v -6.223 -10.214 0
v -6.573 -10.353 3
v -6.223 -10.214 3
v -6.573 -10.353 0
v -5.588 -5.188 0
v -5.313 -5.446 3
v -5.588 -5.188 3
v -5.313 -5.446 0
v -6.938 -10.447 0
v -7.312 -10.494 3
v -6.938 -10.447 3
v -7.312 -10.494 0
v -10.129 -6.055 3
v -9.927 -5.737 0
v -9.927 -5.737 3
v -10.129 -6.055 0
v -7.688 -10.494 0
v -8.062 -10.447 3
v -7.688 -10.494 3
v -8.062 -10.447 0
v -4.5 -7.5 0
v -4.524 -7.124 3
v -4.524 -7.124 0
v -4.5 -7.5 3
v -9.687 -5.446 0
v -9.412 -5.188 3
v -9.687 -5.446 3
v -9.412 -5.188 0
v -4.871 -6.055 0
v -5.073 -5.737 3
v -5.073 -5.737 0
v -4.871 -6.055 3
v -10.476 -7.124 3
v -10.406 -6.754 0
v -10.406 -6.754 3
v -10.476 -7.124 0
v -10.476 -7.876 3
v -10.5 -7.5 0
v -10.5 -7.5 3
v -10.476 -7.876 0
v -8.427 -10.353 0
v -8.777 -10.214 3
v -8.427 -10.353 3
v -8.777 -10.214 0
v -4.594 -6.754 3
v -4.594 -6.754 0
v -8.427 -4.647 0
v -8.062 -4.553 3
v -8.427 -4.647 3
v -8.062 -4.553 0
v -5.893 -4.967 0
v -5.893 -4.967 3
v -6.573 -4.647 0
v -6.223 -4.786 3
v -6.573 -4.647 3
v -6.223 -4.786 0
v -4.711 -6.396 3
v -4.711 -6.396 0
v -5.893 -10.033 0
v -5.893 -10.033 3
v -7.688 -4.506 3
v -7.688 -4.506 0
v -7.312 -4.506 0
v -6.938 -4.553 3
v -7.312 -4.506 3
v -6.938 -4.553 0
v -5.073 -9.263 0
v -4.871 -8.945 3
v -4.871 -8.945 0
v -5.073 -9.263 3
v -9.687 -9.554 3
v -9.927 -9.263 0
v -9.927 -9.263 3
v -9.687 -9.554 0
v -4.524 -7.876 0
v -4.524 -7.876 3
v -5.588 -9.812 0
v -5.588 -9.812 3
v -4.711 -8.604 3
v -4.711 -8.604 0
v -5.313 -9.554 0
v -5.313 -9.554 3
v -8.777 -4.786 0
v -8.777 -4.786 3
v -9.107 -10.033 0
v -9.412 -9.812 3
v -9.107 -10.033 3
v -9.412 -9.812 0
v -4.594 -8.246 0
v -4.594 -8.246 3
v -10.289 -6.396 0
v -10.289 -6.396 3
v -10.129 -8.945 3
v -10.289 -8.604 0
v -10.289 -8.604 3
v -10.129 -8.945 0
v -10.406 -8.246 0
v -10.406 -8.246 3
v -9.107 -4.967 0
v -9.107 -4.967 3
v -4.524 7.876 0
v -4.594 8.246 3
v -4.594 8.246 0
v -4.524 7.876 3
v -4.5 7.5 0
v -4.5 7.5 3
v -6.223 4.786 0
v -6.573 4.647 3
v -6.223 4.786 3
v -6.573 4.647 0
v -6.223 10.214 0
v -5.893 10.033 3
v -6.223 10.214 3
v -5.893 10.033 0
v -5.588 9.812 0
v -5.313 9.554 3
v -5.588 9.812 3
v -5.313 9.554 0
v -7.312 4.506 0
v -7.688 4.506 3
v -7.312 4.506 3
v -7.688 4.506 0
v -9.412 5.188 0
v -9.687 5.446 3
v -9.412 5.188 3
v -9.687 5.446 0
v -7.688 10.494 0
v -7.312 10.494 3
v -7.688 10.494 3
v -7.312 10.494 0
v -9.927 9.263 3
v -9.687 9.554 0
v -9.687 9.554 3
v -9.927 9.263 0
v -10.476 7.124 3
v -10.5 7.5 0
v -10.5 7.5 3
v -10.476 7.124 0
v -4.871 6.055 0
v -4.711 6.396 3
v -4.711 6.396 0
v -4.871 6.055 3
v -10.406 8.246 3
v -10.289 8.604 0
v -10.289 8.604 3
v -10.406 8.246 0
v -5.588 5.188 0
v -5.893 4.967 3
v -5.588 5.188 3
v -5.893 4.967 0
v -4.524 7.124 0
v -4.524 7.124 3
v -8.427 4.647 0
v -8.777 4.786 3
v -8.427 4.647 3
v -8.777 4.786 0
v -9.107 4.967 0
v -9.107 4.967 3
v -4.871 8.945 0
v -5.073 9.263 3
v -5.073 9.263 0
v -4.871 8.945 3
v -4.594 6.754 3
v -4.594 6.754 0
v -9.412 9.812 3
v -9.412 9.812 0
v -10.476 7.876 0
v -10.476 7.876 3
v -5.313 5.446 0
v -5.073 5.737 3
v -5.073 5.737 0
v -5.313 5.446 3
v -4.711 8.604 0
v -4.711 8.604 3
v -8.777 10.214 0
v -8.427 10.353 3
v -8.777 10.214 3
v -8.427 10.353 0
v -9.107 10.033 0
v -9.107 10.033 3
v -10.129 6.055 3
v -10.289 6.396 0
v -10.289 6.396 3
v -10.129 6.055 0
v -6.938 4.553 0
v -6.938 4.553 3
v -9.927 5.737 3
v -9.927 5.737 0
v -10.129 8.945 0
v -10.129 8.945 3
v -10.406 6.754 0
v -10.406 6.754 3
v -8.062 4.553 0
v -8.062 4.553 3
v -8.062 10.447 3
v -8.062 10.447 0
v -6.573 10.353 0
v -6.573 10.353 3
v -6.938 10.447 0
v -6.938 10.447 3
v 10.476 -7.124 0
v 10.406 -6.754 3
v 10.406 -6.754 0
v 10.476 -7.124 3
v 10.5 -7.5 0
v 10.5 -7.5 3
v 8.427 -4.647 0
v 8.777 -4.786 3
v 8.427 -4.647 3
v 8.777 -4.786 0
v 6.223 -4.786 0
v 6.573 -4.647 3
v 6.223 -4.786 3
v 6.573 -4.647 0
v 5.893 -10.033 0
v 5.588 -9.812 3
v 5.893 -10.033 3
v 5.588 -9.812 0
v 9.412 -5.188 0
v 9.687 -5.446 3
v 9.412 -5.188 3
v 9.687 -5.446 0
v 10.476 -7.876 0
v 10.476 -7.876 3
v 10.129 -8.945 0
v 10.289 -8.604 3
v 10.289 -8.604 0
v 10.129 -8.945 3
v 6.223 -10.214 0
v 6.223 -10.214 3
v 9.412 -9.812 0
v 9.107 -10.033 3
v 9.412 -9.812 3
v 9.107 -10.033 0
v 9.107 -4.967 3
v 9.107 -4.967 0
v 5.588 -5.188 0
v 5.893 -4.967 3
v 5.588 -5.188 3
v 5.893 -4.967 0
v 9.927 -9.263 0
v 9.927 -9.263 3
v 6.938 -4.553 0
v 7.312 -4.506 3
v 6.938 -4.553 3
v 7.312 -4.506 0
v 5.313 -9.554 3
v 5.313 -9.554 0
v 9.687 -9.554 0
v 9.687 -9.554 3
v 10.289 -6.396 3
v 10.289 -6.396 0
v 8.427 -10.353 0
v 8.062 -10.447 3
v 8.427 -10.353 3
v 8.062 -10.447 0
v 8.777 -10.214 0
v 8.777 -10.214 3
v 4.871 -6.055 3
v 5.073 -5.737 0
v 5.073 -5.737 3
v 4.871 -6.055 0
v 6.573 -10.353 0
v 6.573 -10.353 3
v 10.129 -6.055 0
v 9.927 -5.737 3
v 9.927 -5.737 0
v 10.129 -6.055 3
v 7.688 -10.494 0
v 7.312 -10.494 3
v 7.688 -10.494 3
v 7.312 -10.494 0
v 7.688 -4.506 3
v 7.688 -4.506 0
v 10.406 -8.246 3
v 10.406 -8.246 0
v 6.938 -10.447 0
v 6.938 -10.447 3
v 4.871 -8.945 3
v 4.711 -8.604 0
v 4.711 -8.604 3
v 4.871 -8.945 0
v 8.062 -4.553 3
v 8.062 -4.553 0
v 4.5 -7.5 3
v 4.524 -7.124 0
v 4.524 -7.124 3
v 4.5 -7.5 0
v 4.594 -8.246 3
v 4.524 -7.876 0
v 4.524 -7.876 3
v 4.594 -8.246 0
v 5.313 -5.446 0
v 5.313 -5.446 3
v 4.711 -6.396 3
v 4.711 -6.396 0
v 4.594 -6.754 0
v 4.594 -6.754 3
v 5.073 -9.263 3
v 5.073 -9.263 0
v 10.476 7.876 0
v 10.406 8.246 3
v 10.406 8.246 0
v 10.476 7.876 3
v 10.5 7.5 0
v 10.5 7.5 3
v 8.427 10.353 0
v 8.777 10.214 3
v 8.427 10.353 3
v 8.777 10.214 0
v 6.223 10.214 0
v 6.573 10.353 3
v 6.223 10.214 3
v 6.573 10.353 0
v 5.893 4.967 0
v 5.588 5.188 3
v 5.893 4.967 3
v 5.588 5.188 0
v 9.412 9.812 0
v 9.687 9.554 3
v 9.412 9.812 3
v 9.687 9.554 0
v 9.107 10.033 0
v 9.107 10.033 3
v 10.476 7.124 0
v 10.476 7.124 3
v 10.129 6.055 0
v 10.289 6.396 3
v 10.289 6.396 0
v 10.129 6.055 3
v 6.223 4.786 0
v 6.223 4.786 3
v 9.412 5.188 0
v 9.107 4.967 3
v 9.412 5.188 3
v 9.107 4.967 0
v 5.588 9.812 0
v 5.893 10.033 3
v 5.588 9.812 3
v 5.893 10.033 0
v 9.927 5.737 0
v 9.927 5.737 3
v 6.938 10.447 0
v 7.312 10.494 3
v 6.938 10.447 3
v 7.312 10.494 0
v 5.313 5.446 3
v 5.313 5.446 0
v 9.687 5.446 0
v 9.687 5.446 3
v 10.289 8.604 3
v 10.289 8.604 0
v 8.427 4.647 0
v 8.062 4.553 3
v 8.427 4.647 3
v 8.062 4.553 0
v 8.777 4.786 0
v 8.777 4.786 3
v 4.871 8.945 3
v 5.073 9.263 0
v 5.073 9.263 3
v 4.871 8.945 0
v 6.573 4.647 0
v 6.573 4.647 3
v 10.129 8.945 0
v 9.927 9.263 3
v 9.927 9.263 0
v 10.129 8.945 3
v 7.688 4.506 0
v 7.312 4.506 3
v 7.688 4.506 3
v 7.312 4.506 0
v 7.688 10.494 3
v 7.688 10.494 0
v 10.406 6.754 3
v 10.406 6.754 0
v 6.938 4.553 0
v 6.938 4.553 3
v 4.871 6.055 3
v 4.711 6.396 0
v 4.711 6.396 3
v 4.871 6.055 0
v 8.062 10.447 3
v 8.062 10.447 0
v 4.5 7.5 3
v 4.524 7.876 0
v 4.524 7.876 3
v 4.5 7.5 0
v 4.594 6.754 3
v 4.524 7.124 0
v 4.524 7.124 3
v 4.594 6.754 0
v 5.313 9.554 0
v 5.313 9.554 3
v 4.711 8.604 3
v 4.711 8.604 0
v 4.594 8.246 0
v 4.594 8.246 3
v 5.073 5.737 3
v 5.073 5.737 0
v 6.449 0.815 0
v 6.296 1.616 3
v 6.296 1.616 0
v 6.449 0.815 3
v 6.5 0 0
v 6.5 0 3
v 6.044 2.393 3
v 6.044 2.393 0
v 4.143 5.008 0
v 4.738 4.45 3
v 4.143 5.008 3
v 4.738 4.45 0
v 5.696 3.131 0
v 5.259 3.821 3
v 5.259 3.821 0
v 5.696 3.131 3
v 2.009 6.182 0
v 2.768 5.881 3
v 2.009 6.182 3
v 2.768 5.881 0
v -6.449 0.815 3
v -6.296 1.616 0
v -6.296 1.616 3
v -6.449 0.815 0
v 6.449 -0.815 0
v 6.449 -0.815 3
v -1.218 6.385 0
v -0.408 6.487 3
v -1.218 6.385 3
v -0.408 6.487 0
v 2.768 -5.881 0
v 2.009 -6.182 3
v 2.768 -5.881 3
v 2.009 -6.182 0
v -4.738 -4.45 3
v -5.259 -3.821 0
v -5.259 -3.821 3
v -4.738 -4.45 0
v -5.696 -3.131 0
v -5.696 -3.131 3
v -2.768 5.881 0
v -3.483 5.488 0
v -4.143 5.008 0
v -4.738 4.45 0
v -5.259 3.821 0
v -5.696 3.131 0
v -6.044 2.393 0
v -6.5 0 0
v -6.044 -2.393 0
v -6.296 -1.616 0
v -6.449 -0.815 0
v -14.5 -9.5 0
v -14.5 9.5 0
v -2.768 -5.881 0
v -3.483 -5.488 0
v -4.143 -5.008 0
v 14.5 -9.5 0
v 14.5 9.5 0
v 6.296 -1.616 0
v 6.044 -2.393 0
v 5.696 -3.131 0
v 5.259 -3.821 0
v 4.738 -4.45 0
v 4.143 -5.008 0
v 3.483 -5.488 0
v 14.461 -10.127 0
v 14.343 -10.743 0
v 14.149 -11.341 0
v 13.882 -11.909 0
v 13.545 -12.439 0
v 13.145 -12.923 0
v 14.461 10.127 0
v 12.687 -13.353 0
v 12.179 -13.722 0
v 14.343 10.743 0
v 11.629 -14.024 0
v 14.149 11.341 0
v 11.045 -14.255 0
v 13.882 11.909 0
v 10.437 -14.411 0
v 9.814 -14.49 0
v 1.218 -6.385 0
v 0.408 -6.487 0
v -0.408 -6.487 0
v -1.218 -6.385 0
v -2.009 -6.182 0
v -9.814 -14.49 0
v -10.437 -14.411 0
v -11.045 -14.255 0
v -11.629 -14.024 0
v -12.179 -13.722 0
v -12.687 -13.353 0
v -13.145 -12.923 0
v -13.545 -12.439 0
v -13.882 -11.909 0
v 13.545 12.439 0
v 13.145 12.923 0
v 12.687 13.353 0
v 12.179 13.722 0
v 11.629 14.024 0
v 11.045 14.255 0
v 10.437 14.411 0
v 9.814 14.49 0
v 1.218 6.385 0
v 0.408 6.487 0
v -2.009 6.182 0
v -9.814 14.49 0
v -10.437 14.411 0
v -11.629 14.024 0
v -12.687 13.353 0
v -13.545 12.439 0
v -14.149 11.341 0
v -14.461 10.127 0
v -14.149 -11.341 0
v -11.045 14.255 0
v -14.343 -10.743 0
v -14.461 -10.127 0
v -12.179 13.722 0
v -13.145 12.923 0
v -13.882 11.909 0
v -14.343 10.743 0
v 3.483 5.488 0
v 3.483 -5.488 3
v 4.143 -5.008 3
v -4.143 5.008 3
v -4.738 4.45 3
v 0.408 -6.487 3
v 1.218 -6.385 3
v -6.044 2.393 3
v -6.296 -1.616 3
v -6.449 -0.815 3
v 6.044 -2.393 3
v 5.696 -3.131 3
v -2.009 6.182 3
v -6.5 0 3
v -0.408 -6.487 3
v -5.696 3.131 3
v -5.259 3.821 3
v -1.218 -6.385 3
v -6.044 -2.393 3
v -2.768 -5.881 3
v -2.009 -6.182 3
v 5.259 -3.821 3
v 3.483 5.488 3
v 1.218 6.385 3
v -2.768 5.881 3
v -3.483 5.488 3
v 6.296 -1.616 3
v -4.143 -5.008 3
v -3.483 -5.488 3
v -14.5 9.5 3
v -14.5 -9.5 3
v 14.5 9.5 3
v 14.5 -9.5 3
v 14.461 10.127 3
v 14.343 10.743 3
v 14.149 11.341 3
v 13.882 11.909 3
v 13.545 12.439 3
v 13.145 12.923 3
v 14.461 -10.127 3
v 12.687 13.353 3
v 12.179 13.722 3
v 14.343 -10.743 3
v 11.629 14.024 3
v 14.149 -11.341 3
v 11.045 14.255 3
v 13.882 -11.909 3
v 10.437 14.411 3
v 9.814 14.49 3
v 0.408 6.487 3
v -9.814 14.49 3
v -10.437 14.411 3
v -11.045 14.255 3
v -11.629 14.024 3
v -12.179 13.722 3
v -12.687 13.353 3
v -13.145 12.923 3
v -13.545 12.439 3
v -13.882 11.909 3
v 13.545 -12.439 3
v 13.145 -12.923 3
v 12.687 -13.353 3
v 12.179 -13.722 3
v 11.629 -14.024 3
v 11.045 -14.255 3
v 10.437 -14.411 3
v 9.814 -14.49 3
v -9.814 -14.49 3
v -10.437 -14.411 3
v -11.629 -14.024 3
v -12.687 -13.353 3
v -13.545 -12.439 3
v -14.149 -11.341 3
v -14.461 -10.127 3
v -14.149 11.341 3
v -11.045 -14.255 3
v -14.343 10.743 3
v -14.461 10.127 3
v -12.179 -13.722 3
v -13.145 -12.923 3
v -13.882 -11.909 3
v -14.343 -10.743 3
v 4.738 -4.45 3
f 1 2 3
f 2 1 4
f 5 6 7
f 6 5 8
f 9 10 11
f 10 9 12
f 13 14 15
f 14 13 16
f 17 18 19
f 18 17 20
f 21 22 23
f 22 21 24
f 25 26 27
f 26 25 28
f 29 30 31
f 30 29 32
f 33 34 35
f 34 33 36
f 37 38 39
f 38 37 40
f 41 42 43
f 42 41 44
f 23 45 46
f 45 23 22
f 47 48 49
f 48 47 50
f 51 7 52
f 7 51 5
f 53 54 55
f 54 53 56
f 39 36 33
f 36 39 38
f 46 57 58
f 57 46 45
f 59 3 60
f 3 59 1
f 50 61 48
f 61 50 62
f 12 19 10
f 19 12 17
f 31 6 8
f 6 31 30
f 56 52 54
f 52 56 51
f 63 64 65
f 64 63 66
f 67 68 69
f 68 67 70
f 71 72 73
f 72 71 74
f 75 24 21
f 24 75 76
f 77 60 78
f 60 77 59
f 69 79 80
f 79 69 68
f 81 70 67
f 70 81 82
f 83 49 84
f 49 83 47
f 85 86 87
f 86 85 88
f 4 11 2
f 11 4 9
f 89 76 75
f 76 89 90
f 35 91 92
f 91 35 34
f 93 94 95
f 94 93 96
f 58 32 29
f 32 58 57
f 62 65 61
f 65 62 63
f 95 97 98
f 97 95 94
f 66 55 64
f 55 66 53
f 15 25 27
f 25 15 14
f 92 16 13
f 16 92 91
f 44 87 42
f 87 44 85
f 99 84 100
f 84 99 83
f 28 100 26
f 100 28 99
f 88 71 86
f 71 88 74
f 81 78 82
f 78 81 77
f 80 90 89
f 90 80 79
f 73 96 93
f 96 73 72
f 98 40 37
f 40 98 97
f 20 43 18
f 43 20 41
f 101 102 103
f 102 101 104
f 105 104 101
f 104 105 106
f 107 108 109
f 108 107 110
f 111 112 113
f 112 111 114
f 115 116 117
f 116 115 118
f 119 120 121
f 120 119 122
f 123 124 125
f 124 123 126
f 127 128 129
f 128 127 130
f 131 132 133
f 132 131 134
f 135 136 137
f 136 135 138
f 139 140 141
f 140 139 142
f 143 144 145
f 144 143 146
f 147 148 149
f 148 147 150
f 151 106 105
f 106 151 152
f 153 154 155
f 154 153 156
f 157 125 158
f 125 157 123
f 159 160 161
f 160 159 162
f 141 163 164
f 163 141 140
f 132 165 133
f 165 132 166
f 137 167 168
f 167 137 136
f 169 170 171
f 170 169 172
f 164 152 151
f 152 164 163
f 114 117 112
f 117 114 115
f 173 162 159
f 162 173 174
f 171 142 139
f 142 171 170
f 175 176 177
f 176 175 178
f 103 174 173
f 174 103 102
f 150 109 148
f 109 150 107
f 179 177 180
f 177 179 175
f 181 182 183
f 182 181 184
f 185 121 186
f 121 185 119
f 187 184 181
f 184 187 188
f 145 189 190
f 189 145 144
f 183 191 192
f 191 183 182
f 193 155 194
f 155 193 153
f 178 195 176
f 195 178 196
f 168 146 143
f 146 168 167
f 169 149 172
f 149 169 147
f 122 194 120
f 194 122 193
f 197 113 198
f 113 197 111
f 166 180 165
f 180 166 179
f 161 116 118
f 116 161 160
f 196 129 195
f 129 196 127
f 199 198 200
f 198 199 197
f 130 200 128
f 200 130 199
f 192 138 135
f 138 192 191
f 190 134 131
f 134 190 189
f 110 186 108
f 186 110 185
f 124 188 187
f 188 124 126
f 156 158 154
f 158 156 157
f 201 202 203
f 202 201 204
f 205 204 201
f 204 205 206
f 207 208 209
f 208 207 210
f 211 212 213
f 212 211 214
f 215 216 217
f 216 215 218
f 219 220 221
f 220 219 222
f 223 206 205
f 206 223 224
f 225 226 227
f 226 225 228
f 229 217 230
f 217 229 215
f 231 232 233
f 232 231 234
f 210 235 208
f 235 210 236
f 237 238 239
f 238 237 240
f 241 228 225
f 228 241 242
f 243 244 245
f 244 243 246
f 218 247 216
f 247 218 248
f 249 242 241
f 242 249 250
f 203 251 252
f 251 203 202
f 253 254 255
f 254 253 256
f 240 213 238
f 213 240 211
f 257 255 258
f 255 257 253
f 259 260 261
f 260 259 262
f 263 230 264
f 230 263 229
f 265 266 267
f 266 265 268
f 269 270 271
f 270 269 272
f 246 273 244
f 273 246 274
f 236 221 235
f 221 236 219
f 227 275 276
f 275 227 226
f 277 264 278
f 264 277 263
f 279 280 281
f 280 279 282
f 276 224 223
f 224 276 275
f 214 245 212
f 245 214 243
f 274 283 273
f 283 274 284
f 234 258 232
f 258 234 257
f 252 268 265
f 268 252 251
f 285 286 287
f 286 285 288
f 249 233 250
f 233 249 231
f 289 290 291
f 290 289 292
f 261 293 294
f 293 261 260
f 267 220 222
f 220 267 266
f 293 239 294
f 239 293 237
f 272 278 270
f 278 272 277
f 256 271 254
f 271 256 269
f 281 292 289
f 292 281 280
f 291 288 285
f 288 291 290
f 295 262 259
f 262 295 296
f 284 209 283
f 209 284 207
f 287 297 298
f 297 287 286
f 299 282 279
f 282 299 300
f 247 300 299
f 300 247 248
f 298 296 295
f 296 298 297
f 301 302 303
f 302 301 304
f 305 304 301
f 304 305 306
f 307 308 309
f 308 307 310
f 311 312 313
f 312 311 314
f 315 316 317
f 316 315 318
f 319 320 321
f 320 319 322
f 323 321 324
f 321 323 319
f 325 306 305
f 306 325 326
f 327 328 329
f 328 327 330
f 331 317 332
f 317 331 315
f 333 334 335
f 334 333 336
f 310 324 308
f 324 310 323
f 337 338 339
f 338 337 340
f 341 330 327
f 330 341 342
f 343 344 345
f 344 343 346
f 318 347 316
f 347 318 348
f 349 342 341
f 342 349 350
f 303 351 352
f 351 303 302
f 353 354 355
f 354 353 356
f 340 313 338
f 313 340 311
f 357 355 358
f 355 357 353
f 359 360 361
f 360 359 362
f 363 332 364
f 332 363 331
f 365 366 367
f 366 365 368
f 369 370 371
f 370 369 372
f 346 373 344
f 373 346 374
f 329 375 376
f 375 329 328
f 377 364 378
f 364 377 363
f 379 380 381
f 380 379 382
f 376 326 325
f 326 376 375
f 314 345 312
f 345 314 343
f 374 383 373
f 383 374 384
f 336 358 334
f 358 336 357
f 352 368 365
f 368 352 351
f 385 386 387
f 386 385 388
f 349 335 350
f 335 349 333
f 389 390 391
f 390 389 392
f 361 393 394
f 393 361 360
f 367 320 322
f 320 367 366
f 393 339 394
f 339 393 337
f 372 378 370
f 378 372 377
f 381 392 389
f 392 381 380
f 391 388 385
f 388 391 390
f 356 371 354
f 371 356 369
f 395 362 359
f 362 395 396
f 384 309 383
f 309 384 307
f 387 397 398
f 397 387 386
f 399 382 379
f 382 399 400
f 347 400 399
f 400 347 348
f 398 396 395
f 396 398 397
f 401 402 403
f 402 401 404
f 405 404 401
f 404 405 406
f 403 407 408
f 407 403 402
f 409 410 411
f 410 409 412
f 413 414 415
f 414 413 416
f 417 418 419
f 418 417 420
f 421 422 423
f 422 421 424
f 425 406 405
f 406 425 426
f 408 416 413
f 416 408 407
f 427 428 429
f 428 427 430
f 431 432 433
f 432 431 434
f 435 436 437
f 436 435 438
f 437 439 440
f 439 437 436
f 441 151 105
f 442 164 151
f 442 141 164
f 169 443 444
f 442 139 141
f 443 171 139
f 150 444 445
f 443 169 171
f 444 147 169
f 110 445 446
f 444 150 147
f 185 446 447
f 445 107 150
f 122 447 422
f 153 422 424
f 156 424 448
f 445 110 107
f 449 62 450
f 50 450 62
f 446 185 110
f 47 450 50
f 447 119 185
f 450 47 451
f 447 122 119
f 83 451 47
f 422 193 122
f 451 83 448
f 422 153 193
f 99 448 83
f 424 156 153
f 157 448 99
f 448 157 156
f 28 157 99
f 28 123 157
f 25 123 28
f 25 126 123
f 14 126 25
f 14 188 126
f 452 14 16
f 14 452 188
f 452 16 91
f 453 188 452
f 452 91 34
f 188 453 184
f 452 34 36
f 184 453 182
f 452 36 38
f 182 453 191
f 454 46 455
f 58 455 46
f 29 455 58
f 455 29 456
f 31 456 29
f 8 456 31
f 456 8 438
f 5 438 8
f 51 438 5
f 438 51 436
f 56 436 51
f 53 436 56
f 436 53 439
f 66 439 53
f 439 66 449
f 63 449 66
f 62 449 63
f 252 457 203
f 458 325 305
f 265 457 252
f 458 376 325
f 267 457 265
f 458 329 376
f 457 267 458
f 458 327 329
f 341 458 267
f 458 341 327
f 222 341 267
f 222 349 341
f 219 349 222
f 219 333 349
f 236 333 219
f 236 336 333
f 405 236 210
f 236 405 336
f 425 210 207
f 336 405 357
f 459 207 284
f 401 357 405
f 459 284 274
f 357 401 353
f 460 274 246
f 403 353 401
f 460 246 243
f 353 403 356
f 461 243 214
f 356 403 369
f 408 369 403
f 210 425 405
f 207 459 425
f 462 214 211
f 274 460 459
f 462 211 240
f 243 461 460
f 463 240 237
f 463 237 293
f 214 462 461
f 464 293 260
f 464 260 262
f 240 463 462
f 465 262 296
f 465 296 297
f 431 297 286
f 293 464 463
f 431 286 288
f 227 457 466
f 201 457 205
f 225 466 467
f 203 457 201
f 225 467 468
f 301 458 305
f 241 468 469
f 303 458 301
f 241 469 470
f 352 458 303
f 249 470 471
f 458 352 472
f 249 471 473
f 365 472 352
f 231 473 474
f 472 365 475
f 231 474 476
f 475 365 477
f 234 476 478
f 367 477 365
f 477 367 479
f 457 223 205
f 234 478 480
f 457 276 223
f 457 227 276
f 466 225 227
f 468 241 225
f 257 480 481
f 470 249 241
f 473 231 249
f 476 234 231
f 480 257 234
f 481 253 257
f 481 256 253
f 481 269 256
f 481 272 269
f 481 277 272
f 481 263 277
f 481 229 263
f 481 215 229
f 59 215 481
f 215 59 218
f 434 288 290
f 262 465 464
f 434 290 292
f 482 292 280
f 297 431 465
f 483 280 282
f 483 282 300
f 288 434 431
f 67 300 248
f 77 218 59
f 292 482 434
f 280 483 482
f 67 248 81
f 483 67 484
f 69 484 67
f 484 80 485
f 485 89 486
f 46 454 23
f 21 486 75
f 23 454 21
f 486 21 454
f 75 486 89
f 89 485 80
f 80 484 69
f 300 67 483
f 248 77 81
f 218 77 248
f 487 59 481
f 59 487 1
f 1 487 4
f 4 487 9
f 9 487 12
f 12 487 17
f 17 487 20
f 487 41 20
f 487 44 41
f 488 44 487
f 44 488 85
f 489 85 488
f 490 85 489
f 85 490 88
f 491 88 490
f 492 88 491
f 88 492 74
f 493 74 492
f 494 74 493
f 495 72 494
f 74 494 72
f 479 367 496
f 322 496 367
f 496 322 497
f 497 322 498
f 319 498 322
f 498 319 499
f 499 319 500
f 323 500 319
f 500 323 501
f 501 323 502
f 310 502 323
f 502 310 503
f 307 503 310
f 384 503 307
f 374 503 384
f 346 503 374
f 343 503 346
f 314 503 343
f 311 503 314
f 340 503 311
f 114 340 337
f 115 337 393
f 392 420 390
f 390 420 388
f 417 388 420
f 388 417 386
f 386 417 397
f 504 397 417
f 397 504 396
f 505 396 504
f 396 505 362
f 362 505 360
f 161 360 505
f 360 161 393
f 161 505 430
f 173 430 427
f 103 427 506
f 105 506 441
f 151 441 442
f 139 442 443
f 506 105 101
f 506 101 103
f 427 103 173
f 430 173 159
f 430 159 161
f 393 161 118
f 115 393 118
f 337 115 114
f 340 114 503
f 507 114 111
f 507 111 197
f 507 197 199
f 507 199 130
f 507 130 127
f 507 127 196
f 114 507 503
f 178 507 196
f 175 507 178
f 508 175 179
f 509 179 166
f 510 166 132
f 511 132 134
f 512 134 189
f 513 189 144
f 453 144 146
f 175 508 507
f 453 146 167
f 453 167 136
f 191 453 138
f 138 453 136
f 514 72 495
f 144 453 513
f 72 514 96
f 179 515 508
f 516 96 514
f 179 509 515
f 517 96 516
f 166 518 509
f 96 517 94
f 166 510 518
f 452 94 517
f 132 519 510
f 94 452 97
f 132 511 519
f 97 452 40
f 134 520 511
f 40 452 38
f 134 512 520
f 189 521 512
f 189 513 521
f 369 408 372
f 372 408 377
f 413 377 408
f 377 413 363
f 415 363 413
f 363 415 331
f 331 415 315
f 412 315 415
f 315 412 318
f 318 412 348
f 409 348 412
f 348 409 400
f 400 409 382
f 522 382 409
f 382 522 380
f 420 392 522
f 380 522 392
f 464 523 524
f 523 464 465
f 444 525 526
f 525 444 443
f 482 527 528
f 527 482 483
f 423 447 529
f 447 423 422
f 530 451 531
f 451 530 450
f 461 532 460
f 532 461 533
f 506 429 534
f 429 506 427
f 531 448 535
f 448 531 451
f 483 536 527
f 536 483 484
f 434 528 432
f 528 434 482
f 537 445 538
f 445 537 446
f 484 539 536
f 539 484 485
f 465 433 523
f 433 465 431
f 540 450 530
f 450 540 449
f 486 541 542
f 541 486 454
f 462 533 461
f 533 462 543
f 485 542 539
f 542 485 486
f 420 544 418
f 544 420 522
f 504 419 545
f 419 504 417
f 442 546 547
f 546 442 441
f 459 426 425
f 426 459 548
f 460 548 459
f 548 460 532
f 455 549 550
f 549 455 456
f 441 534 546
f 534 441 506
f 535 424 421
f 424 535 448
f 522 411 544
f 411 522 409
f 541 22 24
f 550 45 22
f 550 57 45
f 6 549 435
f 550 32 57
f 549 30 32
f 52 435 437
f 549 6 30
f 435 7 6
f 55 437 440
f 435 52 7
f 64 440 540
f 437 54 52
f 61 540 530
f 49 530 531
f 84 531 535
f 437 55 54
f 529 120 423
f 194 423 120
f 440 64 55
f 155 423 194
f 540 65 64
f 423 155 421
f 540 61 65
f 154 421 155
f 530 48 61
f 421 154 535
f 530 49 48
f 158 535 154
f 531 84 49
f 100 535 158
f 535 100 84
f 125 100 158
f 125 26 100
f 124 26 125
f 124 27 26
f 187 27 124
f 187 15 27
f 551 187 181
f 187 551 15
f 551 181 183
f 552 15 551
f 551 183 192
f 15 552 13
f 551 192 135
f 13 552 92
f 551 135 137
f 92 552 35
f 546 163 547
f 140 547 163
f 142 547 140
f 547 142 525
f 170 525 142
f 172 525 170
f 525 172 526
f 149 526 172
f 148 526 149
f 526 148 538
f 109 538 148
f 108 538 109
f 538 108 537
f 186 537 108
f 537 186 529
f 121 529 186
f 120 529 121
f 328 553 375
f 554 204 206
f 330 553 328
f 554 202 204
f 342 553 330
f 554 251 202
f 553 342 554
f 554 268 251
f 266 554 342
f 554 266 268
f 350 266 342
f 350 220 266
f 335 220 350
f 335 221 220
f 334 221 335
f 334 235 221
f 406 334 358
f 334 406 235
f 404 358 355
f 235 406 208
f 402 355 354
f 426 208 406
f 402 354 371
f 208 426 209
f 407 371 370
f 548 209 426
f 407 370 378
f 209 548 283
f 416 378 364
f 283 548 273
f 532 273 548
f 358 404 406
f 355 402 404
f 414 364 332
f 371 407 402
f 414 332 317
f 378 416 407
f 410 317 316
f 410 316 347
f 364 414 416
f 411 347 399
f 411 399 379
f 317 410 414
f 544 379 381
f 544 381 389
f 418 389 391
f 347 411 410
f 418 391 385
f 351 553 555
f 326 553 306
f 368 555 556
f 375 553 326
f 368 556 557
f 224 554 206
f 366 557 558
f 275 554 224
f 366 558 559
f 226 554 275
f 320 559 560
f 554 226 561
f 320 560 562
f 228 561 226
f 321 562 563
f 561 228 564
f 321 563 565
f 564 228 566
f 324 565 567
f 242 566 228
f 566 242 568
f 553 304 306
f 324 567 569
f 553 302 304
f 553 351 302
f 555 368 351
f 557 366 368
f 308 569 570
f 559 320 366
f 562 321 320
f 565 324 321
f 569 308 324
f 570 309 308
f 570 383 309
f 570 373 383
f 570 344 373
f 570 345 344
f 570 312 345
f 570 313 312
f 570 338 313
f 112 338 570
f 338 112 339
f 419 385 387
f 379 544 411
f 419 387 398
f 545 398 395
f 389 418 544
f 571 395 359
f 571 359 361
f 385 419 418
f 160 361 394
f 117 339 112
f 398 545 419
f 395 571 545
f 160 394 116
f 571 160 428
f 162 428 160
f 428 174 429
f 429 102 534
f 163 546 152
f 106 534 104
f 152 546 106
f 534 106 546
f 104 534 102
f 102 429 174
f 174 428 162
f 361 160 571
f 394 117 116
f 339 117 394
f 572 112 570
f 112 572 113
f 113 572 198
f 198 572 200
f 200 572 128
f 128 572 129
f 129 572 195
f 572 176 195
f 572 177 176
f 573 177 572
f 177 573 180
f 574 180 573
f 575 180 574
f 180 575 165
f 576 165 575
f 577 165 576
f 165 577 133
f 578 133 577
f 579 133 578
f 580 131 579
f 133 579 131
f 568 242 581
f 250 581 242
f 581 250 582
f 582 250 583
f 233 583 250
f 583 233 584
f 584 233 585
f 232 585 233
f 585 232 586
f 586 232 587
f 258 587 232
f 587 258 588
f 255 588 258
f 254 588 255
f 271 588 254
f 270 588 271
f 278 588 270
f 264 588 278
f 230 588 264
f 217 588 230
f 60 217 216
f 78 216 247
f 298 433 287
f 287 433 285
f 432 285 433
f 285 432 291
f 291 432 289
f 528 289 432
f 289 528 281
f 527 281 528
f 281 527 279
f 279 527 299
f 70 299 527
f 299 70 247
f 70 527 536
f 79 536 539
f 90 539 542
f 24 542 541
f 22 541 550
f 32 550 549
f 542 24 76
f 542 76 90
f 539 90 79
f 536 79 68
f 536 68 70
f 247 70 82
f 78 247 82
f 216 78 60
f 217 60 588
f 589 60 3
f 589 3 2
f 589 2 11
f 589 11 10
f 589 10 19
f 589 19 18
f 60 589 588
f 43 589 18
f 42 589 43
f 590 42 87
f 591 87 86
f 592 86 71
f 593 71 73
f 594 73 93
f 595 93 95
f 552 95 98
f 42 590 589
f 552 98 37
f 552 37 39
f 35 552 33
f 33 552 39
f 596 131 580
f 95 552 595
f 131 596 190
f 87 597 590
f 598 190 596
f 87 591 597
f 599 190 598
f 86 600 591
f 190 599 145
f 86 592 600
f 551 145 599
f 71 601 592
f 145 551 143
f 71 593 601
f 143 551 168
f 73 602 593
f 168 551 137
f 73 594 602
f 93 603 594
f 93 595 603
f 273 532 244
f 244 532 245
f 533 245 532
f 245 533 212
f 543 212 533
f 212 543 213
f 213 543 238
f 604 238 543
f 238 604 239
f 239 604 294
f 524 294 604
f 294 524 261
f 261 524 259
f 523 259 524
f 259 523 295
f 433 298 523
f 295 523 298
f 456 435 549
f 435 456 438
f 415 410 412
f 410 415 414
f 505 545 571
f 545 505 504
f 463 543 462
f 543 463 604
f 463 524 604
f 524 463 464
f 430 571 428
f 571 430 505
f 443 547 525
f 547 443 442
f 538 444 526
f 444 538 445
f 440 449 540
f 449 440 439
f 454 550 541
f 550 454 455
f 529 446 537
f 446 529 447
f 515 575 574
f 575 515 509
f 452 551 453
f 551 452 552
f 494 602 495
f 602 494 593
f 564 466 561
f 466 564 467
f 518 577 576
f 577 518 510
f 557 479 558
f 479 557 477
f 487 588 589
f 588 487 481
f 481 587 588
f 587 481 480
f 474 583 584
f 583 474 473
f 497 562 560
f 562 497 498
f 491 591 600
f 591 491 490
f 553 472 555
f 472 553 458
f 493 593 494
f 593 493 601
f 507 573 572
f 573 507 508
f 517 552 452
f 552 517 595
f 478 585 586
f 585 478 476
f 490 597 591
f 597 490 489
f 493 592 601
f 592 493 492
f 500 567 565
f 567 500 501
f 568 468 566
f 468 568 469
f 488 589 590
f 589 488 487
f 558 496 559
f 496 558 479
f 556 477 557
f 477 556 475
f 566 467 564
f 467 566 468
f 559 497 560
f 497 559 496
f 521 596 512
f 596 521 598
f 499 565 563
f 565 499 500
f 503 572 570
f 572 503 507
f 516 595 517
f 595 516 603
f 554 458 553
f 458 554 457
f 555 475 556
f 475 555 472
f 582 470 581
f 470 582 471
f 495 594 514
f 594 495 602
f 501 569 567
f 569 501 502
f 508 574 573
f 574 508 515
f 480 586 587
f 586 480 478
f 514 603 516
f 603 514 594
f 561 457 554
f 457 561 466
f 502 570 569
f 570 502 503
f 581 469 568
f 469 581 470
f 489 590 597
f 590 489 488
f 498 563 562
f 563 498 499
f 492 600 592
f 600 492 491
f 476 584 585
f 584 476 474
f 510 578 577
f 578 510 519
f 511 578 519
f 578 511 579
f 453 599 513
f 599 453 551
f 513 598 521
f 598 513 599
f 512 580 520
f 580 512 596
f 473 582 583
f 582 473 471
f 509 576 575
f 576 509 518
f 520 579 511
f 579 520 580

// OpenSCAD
$fn = 50;


difference() {
	union() {
		hull() {
			translate(v = [-9.5000000000, 9.5000000000, 0]) {
				cylinder(h = 3, r = 5);
			}
			translate(v = [9.5000000000, 9.5000000000, 0]) {
				cylinder(h = 3, r = 5);
			}
			translate(v = [-9.5000000000, -9.5000000000, 0]) {
				cylinder(h = 3, r = 5);
			}
			translate(v = [9.5000000000, -9.5000000000, 0]) {
				cylinder(h = 3, r = 5);
			}
		}
	}
	union() {
		#translate(v = [-7.5000000000, -7.5000000000, -100.0000000000]) {
			cylinder(h = 200, r = 3.0000000000);
		}
		#translate(v = [-7.5000000000, 7.5000000000, -100.0000000000]) {
			cylinder(h = 200, r = 3.0000000000);
		}
		#translate(v = [7.5000000000, -7.5000000000, -100.0000000000]) {
			cylinder(h = 200, r = 3.0000000000);
		}
		#translate(v = [7.5000000000, 7.5000000000, -100.0000000000]) {
			cylinder(h = 200, r = 3.0000000000);
		}
		#cylinder(h = 3, r = 6.5000000000);
	}
}
